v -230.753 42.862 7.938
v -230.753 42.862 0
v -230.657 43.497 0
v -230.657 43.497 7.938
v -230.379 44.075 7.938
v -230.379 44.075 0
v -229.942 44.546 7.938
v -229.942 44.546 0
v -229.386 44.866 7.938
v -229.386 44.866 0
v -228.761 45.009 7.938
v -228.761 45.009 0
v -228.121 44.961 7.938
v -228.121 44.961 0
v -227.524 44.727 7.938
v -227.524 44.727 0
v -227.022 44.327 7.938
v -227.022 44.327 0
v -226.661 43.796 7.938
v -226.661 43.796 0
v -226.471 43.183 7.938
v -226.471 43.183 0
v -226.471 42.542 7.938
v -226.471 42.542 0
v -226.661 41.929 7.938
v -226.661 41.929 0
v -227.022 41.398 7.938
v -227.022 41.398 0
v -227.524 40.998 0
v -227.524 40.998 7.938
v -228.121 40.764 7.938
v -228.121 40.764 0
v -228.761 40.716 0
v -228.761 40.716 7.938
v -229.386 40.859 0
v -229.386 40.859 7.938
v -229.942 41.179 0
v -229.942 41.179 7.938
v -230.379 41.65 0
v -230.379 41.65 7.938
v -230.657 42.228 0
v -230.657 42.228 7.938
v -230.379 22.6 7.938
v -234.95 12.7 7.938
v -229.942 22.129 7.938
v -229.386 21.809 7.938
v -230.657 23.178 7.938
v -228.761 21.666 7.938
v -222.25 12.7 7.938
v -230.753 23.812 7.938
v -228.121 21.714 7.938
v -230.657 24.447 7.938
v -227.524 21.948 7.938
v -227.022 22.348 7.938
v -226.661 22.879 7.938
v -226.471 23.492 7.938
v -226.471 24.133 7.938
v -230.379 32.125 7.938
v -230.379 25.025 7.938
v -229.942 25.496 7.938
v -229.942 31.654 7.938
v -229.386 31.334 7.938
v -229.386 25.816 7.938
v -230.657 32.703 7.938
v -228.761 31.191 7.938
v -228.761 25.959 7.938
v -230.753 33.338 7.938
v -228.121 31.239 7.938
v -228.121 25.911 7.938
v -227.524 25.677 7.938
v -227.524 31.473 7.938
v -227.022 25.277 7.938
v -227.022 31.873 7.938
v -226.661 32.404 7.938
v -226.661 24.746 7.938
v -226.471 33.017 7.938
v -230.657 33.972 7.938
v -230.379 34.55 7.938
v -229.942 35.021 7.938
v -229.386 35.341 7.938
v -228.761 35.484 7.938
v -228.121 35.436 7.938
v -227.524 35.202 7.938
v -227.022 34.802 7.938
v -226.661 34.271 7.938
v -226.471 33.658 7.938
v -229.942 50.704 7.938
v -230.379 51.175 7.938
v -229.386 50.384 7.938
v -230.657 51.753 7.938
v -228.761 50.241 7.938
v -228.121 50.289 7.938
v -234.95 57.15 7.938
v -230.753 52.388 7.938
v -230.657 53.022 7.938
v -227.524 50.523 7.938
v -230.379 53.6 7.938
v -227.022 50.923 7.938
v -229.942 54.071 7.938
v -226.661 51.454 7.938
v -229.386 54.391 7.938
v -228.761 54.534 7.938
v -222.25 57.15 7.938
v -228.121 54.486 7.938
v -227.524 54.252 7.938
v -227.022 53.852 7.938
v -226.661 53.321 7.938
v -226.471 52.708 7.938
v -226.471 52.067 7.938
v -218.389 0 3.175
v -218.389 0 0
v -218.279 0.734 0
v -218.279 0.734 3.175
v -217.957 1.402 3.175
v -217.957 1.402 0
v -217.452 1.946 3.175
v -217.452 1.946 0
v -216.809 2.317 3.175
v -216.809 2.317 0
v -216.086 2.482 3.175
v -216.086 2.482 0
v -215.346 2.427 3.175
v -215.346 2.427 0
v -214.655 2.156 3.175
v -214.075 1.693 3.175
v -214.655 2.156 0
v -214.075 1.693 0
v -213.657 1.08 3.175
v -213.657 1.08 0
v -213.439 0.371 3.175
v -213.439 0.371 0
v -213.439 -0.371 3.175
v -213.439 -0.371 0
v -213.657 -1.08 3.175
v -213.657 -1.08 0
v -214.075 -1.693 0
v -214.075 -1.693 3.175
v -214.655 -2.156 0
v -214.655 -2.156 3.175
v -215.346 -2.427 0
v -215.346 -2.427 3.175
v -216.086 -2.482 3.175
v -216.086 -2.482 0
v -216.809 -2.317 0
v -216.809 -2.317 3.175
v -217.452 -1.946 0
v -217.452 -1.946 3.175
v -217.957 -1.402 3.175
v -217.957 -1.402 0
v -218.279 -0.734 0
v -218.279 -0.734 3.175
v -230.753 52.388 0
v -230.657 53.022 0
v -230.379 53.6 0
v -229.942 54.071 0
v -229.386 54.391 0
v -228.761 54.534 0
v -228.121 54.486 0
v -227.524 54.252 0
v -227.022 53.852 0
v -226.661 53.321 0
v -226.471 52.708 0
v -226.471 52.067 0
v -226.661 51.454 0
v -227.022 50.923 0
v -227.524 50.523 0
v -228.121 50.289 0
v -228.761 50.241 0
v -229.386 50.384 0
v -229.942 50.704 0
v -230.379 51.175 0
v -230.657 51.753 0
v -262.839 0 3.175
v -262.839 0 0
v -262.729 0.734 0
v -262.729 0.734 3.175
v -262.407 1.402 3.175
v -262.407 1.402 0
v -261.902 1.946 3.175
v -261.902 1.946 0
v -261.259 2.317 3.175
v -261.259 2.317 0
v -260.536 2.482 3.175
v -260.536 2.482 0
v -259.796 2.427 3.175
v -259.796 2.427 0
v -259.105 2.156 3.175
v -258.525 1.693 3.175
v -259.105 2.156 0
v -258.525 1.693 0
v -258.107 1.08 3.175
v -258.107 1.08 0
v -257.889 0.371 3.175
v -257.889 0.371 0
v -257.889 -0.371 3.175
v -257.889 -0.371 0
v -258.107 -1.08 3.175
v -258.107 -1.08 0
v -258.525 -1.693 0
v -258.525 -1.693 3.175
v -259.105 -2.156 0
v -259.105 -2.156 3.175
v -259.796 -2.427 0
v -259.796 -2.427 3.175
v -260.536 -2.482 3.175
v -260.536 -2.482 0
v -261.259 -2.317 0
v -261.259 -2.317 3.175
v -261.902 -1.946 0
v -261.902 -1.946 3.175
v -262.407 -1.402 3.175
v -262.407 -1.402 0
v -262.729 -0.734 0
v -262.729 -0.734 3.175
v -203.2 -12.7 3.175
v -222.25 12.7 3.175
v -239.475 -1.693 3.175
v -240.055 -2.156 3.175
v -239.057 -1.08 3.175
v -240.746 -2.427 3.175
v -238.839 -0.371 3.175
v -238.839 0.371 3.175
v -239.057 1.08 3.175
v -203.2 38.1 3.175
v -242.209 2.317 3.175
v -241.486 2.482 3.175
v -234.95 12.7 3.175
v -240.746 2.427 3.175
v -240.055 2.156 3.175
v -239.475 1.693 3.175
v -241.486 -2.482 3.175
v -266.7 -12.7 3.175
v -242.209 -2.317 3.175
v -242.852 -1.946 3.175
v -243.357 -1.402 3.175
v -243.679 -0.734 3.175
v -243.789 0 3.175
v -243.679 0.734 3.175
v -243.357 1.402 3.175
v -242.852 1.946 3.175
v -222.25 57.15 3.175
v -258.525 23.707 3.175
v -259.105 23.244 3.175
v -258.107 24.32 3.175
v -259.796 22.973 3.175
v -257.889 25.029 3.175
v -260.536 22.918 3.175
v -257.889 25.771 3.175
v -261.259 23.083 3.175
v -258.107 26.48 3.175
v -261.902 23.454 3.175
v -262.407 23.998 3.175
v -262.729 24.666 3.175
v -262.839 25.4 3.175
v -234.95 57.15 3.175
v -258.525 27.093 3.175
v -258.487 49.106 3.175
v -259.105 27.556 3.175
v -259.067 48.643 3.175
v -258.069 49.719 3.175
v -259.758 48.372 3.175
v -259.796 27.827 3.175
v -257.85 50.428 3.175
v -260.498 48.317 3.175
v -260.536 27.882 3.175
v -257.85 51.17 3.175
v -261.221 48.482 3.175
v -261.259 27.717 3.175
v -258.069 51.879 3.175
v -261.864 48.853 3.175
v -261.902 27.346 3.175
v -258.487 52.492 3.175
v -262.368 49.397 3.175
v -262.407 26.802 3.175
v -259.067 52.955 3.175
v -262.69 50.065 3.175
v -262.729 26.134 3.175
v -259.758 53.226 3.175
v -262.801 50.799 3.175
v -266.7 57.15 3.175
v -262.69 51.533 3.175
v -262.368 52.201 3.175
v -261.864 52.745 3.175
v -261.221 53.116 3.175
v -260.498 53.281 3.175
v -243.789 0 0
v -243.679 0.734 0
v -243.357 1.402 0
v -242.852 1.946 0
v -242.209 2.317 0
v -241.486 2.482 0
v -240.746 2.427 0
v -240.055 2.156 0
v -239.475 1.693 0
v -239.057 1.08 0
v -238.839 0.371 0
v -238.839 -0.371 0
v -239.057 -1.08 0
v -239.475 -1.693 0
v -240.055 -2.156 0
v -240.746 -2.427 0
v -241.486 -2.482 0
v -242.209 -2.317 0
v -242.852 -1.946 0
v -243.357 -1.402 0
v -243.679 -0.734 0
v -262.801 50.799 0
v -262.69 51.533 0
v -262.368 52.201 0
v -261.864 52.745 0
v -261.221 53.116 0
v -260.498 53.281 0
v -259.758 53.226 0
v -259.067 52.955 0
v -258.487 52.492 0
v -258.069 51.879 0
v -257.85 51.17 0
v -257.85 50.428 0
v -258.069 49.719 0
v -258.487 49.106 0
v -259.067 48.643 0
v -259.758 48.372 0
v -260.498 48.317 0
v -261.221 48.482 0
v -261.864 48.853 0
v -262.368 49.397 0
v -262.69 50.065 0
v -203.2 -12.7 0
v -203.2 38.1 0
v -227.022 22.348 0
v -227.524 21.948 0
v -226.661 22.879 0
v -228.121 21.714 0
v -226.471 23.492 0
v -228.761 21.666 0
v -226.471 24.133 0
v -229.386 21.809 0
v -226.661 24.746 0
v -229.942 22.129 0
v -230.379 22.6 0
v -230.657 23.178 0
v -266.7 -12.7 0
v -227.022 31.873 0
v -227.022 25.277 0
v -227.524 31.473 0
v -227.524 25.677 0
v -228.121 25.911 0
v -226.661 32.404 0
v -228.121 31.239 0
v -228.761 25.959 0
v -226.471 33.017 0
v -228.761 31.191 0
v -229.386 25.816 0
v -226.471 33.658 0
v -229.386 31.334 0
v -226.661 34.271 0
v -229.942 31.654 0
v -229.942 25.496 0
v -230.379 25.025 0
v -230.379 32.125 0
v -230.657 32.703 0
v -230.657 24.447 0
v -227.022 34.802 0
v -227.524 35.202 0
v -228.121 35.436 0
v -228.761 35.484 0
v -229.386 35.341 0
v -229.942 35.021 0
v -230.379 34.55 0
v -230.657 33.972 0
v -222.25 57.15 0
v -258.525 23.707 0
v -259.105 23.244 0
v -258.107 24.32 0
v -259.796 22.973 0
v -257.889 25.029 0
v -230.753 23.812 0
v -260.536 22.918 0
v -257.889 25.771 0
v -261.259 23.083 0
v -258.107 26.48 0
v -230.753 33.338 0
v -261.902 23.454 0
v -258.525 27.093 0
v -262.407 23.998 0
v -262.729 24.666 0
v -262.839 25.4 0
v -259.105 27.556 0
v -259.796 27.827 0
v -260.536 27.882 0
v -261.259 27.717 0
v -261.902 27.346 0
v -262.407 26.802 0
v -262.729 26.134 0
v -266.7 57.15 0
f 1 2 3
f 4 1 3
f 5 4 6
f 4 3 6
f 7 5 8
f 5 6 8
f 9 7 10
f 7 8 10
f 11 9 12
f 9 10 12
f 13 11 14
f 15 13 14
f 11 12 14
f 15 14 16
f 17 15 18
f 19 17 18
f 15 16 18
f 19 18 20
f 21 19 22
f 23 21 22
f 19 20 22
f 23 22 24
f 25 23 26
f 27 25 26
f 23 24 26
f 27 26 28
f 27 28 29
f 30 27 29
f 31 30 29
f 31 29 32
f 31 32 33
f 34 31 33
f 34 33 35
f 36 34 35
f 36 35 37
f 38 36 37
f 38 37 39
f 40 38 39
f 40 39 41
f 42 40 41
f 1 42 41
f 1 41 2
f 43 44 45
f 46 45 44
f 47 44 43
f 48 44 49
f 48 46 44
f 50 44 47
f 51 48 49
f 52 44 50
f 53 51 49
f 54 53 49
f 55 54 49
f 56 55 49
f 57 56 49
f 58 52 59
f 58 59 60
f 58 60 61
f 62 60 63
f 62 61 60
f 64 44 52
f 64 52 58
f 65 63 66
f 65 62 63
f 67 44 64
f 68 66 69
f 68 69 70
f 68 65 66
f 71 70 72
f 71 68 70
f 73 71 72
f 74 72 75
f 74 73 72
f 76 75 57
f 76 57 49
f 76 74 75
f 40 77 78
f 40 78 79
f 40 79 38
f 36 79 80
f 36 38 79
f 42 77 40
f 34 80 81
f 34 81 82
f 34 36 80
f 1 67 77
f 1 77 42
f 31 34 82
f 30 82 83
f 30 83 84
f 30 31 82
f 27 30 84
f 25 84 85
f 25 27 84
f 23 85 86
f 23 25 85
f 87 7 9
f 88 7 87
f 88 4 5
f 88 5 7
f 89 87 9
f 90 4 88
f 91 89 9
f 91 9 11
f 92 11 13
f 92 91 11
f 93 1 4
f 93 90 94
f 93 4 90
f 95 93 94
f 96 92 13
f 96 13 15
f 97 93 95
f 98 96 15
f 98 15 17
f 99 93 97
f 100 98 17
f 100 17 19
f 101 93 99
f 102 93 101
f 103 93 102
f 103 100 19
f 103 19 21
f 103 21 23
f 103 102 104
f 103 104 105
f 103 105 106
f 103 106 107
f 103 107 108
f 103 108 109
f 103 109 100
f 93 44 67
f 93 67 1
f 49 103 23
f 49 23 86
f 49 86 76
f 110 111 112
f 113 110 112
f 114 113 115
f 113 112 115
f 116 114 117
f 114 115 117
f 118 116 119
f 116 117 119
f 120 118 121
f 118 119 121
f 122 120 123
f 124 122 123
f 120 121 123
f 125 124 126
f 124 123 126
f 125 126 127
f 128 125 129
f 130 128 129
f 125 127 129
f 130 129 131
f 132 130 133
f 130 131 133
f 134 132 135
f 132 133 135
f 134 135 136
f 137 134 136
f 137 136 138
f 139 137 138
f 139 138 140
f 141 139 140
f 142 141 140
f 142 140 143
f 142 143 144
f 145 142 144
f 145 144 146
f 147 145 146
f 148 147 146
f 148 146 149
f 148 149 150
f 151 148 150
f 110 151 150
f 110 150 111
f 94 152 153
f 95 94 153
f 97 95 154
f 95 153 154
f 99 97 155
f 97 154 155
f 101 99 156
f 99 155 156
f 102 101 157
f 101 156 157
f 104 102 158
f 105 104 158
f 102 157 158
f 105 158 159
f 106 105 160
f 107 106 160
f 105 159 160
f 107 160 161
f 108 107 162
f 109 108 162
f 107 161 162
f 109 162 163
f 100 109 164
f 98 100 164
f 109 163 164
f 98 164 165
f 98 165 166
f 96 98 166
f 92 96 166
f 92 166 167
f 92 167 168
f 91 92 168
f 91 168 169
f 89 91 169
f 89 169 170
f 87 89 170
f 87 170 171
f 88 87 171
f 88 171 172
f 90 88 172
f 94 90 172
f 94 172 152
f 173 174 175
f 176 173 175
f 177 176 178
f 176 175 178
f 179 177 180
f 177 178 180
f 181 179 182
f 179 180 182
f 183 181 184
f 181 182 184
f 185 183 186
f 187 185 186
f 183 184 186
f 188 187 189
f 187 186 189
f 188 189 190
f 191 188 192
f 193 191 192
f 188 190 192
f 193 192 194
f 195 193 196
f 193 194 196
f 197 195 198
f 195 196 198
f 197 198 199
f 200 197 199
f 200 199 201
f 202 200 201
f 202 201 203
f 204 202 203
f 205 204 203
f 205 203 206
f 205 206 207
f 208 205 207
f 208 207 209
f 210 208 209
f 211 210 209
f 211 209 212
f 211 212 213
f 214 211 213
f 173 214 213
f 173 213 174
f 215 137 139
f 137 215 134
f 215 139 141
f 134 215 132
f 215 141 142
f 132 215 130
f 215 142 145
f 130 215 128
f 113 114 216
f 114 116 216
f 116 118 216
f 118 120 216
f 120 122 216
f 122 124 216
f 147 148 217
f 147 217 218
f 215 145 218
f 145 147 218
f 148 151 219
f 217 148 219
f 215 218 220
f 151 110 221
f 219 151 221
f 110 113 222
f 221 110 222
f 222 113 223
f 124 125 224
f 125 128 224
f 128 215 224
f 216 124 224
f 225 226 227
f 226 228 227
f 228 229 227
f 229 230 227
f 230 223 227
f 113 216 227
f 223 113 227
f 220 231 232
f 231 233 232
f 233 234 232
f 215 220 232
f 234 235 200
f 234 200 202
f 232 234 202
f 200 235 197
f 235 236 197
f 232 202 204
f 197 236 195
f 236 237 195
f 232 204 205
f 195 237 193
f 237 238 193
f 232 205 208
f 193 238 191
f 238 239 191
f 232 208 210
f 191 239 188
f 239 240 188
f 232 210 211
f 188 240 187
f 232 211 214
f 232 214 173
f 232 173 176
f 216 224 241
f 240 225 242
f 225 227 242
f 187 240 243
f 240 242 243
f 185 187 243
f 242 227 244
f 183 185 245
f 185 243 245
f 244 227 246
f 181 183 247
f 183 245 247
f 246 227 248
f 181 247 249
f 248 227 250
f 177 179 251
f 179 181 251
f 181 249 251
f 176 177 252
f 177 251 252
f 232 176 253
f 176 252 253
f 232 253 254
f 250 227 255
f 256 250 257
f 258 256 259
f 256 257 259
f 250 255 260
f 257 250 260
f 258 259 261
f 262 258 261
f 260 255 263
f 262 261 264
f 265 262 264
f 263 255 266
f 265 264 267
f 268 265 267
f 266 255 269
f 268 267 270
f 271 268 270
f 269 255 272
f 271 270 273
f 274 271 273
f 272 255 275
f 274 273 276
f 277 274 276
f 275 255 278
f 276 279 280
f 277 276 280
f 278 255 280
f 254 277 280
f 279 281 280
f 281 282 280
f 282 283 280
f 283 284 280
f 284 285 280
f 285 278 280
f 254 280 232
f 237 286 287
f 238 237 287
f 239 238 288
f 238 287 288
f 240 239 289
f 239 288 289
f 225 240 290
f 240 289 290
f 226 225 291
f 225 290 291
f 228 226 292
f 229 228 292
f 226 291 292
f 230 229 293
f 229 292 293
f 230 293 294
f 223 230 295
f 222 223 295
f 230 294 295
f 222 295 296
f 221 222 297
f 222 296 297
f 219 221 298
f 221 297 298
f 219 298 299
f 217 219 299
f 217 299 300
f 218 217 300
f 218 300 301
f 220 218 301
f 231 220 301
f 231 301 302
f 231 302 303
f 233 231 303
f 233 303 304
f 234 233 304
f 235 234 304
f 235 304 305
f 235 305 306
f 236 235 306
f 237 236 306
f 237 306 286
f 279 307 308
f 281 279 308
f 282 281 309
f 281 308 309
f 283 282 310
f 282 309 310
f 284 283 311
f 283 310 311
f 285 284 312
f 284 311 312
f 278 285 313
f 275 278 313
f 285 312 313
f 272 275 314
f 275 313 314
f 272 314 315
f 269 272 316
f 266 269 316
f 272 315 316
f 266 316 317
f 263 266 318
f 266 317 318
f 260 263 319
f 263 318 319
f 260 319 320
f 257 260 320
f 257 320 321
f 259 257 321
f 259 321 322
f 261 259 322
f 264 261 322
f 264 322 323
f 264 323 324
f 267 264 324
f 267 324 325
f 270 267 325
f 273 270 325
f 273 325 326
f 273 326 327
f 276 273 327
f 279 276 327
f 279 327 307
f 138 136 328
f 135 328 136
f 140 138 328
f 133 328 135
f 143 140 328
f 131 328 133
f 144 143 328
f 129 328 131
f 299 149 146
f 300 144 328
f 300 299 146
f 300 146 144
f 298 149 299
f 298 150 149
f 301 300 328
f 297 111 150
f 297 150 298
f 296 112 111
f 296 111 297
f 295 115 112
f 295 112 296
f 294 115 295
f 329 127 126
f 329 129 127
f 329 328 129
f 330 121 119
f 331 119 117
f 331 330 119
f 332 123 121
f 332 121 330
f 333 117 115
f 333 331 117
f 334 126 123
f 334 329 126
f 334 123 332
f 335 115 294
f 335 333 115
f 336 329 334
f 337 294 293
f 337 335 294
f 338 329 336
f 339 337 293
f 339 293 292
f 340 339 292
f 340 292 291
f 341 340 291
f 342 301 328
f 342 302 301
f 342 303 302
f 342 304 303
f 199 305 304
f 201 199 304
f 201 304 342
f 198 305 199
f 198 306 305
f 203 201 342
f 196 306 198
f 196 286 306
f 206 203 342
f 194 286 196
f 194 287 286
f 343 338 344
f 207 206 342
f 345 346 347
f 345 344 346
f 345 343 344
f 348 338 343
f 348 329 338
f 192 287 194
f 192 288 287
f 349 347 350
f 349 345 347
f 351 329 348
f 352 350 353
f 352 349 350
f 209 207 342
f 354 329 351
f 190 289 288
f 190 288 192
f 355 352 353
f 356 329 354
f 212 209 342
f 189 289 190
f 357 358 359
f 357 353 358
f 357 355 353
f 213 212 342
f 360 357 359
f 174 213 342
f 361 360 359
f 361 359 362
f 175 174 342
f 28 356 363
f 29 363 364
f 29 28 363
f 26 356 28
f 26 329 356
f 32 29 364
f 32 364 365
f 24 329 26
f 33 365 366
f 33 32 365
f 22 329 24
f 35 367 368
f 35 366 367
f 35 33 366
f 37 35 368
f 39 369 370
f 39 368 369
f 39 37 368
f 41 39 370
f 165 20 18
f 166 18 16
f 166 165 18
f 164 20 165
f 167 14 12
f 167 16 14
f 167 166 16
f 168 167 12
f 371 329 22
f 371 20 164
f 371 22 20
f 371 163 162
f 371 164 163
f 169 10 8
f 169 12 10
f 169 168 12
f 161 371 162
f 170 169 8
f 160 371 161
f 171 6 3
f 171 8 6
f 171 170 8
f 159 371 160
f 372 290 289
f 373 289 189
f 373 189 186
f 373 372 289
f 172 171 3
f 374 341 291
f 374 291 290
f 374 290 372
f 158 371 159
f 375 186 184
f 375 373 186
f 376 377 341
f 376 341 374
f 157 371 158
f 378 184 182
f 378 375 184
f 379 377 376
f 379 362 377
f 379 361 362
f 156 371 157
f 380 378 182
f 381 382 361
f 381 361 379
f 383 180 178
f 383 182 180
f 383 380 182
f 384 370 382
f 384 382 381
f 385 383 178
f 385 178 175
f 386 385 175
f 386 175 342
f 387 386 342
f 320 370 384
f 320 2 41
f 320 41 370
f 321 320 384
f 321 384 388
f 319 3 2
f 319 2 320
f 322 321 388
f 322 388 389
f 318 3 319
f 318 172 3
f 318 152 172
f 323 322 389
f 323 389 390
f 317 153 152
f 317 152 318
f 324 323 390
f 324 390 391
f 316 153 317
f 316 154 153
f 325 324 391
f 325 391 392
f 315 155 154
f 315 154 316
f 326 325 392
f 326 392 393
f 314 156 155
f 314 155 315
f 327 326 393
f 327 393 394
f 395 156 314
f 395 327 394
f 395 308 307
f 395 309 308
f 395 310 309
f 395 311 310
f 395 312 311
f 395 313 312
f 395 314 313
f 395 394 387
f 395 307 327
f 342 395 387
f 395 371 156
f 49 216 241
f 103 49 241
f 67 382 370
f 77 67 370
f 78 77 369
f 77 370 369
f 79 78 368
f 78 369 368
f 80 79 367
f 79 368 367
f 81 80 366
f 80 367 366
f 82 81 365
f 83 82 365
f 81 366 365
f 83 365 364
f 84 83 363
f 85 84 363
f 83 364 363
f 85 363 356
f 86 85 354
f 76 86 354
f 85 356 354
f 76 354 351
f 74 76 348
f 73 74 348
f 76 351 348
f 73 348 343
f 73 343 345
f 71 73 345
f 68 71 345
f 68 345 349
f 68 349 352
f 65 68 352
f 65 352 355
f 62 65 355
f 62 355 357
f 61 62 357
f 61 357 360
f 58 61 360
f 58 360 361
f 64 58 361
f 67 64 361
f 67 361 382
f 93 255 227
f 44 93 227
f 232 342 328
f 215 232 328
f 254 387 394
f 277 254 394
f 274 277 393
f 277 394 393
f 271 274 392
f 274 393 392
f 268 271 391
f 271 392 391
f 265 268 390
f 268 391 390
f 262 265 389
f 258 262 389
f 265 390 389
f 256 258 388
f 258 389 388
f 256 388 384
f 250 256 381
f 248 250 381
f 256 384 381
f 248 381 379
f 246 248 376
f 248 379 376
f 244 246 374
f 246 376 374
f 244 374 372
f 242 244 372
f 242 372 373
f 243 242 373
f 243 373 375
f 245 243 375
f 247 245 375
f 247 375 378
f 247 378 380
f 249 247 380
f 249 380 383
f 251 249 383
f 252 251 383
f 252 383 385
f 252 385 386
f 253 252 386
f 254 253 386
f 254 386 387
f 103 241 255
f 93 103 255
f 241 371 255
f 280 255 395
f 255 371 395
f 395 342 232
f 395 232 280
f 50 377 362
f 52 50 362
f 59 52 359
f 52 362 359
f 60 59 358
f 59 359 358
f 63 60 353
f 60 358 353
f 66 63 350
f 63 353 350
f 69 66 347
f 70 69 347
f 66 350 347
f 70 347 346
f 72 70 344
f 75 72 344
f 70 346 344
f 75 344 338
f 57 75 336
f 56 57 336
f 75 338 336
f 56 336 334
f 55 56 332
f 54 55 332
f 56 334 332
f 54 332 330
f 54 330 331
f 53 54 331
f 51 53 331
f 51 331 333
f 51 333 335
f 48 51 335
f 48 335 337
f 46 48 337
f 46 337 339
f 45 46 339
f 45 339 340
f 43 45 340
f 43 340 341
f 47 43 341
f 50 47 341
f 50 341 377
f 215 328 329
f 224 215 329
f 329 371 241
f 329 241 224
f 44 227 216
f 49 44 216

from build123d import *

# Parameters (mm, degrees)
BOSS_EXTRUDE1_DEPTH    = 3.175
F_10_CLEARANCE_HOLE1_D = 4.9784
BOSS_EXTRUDE2_DEPTH    = 4.7625
F_8_CLEARANCE_HOLE1_D  = 4.3053


with BuildPart() as part:
    # Sketch1 → Boss-Extrude1 (new body)
    with BuildSketch(Plane.XY):
        Polygon((-254.000000508, -12.7), (-266.700000508, -12.7), (-266.700000508, 57.15), (-254.000000508, 57.15), (-222.250000508, 57.15), (-203.200000508, 38.1), (-203.200000508, 12.7), (-203.200000508, -12.7), align=None)
    extrude(amount=BOSS_EXTRUDE1_DEPTH)

    # #10 Clearance Hole1 (through all)
    with Locations(Plane.XY.offset(3.175)):
        with Locations((-260.311771093, 50.798866939), (-260.350000508, 25.4), (-260.350000508, 0), (-241.300000508, 0), (-215.900000508, 0)):
            Hole(F_10_CLEARANCE_HOLE1_D / 2)

    # Sketch5 → Boss-Extrude2 (add)
    with BuildSketch(Plane.XY.offset(3.175)):
        Polygon((-222.250000508, 57.15), (-234.950000508, 57.15), (-234.950000508, 12.7), (-222.250000508, 12.7), (-222.250000508, 50.8), align=None)
    extrude(amount=BOSS_EXTRUDE2_DEPTH)

    # #8 Clearance Hole1 (through all)
    with Locations(Plane.XY.offset(7.9375)):
        with Locations((-228.600000508, 42.8625), (-228.600000508, 52.3875), (-228.600000508, 33.3375), (-228.600000508, 23.8125)):
            Hole(F_8_CLEARANCE_HOLE1_D / 2)


solid = part.part
